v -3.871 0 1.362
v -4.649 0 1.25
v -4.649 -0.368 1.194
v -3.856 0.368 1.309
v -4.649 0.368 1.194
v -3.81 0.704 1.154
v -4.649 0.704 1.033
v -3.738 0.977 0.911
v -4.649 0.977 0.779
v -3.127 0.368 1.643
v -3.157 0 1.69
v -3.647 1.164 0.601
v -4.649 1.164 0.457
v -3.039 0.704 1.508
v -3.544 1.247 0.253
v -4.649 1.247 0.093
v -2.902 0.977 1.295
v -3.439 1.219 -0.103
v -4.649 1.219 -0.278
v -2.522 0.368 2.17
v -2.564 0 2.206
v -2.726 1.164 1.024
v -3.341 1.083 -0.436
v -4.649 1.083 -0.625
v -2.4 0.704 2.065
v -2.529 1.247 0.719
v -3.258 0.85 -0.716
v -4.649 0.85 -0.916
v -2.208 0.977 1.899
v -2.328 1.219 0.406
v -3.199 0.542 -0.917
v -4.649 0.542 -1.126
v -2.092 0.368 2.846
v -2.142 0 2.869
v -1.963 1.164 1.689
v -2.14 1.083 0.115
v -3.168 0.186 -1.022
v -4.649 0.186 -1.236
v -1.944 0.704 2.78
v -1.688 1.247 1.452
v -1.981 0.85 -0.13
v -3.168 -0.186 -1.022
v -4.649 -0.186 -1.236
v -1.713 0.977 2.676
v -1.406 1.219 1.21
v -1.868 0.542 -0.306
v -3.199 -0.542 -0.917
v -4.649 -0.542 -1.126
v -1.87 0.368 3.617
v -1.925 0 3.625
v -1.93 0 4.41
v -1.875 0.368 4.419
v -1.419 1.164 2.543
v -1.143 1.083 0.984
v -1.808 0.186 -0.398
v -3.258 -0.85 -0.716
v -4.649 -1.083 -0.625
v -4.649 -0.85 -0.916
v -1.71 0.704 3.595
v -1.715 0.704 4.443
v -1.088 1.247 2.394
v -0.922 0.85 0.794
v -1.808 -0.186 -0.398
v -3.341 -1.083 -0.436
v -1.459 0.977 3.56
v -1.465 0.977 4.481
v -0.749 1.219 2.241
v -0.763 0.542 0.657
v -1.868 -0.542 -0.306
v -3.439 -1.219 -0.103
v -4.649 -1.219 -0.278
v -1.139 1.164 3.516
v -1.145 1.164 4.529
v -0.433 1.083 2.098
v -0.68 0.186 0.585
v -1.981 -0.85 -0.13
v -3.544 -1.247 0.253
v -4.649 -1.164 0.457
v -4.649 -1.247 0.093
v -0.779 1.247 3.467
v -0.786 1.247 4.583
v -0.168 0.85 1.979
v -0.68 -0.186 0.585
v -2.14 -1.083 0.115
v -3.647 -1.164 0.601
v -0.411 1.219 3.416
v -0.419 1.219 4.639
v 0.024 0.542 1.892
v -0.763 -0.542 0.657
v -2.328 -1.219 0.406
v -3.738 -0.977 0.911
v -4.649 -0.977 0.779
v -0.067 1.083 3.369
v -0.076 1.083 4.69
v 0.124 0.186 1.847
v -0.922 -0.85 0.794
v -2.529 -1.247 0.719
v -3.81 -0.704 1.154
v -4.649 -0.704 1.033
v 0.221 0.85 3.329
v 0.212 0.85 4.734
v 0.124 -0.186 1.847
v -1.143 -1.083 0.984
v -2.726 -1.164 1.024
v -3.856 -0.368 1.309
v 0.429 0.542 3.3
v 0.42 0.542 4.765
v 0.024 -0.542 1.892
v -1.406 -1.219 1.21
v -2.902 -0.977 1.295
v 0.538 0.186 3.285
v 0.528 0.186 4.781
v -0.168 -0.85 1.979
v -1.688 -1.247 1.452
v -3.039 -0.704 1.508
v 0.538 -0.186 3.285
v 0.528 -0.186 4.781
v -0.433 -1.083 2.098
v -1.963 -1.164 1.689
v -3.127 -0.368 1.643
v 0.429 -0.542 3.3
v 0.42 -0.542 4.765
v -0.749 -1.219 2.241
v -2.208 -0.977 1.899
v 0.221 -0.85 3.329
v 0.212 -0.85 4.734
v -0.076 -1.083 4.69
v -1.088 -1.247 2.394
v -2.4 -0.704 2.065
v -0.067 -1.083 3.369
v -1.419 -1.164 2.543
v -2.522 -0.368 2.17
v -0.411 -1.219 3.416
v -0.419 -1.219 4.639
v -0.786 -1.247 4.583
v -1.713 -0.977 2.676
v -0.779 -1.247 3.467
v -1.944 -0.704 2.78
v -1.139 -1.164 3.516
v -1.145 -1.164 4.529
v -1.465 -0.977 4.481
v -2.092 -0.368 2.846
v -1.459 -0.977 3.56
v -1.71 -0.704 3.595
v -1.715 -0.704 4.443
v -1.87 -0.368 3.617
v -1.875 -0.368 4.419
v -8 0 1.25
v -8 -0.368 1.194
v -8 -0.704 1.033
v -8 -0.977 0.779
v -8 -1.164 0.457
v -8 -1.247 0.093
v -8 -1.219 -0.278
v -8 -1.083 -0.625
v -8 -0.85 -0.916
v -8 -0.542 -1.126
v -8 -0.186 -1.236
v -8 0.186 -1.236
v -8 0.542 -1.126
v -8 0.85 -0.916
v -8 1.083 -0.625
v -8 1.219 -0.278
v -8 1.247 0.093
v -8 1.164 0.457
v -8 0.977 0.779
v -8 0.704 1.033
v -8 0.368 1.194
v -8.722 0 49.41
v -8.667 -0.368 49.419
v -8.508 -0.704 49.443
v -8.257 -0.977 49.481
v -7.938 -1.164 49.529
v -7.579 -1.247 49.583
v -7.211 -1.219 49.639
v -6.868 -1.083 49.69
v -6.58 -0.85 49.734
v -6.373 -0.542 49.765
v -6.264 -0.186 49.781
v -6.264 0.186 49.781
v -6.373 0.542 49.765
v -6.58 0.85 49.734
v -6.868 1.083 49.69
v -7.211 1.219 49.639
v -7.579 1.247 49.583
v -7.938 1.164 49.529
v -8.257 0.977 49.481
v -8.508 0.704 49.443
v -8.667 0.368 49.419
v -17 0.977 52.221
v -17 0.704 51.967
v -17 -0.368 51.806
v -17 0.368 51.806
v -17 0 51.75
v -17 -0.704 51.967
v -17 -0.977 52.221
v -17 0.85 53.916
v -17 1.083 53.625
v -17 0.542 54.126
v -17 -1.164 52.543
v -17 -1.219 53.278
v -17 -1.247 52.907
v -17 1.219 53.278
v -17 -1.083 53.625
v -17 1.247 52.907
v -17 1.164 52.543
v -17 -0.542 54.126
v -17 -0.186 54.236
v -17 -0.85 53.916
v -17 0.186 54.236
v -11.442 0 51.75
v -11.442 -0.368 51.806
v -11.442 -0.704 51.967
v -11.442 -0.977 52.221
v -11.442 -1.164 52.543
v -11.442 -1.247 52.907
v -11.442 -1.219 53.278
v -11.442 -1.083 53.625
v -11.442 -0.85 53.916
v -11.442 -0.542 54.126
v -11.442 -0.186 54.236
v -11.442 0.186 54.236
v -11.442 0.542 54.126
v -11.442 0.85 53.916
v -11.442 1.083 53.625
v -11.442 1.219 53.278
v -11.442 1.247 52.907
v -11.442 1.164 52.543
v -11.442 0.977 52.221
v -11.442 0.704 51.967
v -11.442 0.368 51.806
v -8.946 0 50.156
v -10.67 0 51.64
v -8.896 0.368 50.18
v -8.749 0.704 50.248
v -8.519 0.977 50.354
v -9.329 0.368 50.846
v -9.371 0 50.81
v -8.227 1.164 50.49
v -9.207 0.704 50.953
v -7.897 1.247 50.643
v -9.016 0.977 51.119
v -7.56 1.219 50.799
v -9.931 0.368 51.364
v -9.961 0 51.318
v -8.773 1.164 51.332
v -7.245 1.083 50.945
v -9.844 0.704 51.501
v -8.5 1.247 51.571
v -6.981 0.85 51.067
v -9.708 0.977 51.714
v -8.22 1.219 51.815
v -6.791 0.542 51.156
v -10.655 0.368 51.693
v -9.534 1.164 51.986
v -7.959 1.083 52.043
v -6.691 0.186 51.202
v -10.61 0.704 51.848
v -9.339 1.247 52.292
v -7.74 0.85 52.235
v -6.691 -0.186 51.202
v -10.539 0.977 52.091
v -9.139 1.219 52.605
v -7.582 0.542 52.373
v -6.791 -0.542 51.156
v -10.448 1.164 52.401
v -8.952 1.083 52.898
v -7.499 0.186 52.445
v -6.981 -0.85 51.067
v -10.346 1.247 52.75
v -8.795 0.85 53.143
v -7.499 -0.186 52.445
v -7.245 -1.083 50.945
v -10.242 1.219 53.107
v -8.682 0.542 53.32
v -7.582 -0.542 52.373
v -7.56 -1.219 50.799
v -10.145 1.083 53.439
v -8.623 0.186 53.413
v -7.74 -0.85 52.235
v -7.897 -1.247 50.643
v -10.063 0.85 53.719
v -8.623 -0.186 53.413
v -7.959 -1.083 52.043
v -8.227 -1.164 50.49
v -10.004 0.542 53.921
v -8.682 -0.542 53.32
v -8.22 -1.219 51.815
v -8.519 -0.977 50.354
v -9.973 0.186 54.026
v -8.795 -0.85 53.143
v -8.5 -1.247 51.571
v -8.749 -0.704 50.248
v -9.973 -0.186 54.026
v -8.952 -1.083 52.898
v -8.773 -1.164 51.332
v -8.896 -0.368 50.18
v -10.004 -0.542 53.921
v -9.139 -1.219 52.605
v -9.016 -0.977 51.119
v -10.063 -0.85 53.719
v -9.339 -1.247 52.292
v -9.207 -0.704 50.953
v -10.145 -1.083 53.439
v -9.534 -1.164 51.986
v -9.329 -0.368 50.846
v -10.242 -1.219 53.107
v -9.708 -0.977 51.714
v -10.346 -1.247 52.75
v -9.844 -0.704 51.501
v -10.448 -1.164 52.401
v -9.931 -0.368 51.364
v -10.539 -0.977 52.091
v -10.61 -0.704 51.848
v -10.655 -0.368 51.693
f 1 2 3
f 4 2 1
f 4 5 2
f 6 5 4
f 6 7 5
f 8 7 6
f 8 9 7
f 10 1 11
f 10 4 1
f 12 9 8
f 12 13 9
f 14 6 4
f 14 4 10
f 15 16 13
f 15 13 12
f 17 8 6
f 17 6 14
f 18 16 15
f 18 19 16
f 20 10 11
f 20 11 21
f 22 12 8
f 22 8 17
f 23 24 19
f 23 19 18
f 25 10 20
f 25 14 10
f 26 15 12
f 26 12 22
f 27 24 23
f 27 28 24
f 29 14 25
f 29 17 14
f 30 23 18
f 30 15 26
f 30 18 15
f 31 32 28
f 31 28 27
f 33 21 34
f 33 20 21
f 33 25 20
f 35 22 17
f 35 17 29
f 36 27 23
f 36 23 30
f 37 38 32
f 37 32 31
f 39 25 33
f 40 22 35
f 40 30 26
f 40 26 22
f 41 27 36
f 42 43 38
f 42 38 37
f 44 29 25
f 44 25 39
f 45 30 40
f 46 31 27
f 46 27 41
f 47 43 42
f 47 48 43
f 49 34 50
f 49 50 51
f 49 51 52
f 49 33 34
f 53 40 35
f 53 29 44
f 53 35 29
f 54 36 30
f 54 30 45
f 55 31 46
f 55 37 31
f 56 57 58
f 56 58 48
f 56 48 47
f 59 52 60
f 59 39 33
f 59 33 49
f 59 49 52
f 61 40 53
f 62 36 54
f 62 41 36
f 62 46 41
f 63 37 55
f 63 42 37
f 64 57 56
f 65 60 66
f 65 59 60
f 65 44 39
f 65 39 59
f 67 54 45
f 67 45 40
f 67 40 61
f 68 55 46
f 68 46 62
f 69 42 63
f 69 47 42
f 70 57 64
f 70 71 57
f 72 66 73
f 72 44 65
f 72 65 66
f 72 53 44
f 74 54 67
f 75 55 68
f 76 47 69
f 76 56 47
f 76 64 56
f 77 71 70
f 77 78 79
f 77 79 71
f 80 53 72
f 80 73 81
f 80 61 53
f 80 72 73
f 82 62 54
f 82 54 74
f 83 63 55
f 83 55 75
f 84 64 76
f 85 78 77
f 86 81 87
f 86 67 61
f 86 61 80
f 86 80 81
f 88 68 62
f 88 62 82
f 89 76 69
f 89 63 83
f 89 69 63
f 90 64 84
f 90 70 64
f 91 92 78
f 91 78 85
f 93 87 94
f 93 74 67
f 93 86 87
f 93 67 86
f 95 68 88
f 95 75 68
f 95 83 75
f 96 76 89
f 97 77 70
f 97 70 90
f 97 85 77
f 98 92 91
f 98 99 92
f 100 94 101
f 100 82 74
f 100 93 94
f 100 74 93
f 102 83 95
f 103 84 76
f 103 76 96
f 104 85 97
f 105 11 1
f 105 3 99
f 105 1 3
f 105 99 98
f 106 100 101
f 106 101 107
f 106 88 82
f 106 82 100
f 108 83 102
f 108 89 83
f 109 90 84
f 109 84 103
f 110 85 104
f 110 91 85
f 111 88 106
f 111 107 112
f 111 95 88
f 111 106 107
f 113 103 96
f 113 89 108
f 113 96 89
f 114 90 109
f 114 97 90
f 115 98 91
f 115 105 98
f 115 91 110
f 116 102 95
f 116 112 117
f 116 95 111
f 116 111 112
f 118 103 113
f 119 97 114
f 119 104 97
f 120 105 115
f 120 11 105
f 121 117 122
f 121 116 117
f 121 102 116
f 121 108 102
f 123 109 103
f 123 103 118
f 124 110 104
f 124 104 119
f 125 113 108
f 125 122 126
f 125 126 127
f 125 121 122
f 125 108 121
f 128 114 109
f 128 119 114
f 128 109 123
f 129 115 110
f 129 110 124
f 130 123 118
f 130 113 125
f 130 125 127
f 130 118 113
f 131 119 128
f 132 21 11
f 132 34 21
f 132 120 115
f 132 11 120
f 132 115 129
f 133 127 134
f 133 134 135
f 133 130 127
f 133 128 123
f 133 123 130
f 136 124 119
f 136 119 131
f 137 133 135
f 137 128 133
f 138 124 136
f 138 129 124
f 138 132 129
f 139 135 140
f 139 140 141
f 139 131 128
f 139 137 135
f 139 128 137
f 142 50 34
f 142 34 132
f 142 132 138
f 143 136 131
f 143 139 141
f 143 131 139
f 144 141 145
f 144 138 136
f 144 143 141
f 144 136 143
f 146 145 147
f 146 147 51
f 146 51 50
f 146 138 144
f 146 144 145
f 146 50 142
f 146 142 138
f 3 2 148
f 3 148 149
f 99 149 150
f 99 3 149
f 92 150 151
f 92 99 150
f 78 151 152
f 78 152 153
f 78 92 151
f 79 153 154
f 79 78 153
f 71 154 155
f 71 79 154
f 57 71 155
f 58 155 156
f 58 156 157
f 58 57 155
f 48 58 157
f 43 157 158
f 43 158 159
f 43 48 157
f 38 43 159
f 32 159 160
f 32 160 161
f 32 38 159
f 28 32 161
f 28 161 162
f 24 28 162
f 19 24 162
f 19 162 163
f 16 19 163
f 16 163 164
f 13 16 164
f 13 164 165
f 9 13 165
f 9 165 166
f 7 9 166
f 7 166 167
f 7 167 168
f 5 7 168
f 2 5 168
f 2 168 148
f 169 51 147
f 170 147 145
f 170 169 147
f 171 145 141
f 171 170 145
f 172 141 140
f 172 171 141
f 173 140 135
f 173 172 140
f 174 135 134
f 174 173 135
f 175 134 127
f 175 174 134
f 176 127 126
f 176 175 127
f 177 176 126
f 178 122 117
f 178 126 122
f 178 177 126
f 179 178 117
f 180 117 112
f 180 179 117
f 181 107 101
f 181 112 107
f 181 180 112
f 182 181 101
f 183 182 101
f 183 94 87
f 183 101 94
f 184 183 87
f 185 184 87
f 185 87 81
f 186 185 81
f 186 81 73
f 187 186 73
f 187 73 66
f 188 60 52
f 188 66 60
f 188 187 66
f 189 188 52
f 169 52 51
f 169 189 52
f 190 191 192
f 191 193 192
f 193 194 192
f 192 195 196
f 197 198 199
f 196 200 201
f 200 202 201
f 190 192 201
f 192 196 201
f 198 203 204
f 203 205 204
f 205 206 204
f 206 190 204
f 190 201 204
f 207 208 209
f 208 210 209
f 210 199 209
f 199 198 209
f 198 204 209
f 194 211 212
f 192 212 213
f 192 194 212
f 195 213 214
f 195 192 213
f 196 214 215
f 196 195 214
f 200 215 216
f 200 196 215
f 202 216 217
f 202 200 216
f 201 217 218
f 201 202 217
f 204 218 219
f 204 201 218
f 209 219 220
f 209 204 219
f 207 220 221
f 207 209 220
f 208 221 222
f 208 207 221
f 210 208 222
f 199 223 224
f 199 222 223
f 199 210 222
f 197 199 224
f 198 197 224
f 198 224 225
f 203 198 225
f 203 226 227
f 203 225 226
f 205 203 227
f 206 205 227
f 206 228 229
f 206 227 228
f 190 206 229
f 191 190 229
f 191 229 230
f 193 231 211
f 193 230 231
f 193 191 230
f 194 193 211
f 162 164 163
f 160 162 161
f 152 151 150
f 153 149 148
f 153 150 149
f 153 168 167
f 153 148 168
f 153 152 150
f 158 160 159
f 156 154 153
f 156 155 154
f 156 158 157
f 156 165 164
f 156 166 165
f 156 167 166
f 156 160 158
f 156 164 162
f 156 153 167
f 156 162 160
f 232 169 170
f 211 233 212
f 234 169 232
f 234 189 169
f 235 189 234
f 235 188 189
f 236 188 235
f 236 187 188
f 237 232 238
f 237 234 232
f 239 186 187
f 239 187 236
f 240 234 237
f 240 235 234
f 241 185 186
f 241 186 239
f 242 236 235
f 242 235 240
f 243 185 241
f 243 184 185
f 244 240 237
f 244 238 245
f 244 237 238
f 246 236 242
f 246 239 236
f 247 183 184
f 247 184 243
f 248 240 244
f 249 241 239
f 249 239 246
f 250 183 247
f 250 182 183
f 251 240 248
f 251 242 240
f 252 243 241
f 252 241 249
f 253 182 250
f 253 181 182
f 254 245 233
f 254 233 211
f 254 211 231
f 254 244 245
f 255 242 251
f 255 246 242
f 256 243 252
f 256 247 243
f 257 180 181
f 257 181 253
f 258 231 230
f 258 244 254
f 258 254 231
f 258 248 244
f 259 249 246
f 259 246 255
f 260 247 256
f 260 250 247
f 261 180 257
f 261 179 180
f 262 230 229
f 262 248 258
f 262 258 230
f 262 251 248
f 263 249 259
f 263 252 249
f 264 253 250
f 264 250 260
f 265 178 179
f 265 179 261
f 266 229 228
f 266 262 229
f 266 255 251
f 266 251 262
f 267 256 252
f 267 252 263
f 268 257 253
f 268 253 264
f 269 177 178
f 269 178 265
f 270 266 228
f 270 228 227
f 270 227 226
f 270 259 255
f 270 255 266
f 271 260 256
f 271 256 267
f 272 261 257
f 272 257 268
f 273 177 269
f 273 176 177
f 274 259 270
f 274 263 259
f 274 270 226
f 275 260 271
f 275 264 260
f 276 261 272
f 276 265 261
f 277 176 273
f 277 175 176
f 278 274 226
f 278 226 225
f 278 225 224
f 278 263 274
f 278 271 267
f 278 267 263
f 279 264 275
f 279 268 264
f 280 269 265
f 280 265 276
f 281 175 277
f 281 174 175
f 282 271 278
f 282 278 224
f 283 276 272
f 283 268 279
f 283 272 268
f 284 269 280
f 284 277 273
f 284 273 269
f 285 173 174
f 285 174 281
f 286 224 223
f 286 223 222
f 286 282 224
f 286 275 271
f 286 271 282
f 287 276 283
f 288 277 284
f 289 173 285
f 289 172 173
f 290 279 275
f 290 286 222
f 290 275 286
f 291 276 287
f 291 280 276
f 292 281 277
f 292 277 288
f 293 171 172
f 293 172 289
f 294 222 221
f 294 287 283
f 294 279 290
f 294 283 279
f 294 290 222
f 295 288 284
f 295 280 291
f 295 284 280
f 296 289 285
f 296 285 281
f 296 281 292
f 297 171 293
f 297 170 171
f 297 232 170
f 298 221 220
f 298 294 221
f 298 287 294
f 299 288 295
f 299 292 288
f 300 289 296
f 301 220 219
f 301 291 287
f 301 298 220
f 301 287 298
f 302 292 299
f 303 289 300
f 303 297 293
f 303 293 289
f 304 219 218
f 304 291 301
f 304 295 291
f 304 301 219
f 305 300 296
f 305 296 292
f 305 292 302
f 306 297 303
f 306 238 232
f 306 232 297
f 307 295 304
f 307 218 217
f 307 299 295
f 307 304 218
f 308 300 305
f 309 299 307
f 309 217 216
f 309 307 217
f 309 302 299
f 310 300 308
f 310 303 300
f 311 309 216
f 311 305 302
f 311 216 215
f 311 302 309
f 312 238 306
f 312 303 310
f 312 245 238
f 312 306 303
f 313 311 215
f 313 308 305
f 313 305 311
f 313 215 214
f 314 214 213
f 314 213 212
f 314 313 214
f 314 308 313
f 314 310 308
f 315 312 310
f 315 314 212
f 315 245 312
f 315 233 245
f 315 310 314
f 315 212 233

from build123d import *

# Parameters (mm, degrees)
SKETCH2_R = 1.25


with BuildPart() as part:
    # Sweep1: sweep along a path in Sketch1
    with BuildLine(Plane(origin=(0, 0, 0), x_dir=(1, 0, 0), z_dir=(0, 1, 0))) as sweep1_path:
        Line((-8, 0), (-4.649084765, 0))
        ThreePointArc((-4.649084765, 0), (-1.616920267, -1.391172972), (-0.693888418, -4.597010769))
        Line((-0.693888418, -4.597010769), (-7.486341248, -49.597010769))
        ThreePointArc((-7.486341248, -49.597010769), (-8.832710567, -52.032164497), (-11.441537595, -53))
        Line((-11.441537595, -53), (-17, -53))
    # Sketch2 → Sweep1 (sweep)
    with BuildSketch(Plane.ZY.offset(8)):
        Circle(SKETCH2_R)
    sweep(path=sweep1_path.line)


solid = part.part
